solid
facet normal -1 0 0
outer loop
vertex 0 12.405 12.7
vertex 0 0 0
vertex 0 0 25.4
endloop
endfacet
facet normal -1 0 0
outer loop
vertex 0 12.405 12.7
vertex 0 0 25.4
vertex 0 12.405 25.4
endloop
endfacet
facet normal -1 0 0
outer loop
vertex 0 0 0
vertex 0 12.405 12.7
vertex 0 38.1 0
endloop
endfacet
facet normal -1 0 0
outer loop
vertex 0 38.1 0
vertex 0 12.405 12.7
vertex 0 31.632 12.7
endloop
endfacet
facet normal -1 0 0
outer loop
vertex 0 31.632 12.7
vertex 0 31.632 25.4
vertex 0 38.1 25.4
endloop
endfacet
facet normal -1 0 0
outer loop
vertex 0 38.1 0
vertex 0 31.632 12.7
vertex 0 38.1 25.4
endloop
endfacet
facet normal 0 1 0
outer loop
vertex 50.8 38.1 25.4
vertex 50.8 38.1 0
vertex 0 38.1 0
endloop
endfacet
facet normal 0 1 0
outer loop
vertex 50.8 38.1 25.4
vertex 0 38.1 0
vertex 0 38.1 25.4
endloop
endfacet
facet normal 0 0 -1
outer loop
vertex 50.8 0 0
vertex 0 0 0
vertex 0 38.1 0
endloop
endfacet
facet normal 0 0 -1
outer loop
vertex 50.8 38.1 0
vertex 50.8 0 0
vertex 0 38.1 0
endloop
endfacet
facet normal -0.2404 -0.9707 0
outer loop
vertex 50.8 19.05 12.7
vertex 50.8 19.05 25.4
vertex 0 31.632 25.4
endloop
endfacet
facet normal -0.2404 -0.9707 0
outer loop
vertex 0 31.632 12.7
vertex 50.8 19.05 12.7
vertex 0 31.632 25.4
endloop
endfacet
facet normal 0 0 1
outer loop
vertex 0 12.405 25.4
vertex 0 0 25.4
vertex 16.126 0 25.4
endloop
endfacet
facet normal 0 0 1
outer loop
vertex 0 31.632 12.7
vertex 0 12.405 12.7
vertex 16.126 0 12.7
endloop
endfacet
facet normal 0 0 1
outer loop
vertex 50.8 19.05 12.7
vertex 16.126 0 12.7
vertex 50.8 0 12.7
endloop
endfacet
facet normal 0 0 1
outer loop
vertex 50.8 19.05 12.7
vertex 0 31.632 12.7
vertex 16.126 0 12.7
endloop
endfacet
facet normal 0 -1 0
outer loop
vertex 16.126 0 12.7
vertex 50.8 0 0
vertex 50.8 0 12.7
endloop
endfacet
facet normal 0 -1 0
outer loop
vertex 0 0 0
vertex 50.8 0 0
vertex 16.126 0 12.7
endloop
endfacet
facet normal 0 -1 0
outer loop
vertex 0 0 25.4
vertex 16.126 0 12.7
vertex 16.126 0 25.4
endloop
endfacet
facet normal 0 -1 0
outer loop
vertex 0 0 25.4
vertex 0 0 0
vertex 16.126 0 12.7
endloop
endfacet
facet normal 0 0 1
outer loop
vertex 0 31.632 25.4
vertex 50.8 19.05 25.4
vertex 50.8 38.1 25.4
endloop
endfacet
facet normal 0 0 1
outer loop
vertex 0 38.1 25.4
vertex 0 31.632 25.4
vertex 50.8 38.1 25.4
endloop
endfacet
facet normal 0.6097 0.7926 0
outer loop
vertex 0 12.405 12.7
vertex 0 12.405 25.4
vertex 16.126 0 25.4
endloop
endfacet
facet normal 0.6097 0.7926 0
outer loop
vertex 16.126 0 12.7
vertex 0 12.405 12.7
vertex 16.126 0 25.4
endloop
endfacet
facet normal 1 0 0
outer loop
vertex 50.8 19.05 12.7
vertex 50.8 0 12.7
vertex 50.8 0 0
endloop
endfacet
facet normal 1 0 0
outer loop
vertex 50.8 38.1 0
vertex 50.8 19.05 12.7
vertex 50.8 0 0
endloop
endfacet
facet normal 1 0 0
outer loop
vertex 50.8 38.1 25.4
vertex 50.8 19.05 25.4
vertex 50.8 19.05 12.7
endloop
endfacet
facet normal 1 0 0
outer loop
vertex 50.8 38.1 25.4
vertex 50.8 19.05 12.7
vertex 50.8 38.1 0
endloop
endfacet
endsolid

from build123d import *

# Parameters (mm, degrees)
F0_W     = 38.1
F0_H     = 25.4
F1_DEPTH = 50.8
F3_DEPTH = 12.7


with BuildPart() as f1:
    # F0 (on Right) → F1 (new body)
    with BuildSketch(Plane.YZ):
        with Locations((19.05, 12.7)):
            Rectangle(F0_W, F0_H)
    extrude(amount=F1_DEPTH)

    # F2 (on face) → F3 (cut)
    with BuildSketch(Plane.XY.offset(25.4)):
        Polygon((0, 12.404651), (16.126048, 0), (50.8, 0), (50.8, 19.05), (0, 31.631861), align=None)
    extrude(amount=-F3_DEPTH, mode=Mode.SUBTRACT)


solid = f1.part
